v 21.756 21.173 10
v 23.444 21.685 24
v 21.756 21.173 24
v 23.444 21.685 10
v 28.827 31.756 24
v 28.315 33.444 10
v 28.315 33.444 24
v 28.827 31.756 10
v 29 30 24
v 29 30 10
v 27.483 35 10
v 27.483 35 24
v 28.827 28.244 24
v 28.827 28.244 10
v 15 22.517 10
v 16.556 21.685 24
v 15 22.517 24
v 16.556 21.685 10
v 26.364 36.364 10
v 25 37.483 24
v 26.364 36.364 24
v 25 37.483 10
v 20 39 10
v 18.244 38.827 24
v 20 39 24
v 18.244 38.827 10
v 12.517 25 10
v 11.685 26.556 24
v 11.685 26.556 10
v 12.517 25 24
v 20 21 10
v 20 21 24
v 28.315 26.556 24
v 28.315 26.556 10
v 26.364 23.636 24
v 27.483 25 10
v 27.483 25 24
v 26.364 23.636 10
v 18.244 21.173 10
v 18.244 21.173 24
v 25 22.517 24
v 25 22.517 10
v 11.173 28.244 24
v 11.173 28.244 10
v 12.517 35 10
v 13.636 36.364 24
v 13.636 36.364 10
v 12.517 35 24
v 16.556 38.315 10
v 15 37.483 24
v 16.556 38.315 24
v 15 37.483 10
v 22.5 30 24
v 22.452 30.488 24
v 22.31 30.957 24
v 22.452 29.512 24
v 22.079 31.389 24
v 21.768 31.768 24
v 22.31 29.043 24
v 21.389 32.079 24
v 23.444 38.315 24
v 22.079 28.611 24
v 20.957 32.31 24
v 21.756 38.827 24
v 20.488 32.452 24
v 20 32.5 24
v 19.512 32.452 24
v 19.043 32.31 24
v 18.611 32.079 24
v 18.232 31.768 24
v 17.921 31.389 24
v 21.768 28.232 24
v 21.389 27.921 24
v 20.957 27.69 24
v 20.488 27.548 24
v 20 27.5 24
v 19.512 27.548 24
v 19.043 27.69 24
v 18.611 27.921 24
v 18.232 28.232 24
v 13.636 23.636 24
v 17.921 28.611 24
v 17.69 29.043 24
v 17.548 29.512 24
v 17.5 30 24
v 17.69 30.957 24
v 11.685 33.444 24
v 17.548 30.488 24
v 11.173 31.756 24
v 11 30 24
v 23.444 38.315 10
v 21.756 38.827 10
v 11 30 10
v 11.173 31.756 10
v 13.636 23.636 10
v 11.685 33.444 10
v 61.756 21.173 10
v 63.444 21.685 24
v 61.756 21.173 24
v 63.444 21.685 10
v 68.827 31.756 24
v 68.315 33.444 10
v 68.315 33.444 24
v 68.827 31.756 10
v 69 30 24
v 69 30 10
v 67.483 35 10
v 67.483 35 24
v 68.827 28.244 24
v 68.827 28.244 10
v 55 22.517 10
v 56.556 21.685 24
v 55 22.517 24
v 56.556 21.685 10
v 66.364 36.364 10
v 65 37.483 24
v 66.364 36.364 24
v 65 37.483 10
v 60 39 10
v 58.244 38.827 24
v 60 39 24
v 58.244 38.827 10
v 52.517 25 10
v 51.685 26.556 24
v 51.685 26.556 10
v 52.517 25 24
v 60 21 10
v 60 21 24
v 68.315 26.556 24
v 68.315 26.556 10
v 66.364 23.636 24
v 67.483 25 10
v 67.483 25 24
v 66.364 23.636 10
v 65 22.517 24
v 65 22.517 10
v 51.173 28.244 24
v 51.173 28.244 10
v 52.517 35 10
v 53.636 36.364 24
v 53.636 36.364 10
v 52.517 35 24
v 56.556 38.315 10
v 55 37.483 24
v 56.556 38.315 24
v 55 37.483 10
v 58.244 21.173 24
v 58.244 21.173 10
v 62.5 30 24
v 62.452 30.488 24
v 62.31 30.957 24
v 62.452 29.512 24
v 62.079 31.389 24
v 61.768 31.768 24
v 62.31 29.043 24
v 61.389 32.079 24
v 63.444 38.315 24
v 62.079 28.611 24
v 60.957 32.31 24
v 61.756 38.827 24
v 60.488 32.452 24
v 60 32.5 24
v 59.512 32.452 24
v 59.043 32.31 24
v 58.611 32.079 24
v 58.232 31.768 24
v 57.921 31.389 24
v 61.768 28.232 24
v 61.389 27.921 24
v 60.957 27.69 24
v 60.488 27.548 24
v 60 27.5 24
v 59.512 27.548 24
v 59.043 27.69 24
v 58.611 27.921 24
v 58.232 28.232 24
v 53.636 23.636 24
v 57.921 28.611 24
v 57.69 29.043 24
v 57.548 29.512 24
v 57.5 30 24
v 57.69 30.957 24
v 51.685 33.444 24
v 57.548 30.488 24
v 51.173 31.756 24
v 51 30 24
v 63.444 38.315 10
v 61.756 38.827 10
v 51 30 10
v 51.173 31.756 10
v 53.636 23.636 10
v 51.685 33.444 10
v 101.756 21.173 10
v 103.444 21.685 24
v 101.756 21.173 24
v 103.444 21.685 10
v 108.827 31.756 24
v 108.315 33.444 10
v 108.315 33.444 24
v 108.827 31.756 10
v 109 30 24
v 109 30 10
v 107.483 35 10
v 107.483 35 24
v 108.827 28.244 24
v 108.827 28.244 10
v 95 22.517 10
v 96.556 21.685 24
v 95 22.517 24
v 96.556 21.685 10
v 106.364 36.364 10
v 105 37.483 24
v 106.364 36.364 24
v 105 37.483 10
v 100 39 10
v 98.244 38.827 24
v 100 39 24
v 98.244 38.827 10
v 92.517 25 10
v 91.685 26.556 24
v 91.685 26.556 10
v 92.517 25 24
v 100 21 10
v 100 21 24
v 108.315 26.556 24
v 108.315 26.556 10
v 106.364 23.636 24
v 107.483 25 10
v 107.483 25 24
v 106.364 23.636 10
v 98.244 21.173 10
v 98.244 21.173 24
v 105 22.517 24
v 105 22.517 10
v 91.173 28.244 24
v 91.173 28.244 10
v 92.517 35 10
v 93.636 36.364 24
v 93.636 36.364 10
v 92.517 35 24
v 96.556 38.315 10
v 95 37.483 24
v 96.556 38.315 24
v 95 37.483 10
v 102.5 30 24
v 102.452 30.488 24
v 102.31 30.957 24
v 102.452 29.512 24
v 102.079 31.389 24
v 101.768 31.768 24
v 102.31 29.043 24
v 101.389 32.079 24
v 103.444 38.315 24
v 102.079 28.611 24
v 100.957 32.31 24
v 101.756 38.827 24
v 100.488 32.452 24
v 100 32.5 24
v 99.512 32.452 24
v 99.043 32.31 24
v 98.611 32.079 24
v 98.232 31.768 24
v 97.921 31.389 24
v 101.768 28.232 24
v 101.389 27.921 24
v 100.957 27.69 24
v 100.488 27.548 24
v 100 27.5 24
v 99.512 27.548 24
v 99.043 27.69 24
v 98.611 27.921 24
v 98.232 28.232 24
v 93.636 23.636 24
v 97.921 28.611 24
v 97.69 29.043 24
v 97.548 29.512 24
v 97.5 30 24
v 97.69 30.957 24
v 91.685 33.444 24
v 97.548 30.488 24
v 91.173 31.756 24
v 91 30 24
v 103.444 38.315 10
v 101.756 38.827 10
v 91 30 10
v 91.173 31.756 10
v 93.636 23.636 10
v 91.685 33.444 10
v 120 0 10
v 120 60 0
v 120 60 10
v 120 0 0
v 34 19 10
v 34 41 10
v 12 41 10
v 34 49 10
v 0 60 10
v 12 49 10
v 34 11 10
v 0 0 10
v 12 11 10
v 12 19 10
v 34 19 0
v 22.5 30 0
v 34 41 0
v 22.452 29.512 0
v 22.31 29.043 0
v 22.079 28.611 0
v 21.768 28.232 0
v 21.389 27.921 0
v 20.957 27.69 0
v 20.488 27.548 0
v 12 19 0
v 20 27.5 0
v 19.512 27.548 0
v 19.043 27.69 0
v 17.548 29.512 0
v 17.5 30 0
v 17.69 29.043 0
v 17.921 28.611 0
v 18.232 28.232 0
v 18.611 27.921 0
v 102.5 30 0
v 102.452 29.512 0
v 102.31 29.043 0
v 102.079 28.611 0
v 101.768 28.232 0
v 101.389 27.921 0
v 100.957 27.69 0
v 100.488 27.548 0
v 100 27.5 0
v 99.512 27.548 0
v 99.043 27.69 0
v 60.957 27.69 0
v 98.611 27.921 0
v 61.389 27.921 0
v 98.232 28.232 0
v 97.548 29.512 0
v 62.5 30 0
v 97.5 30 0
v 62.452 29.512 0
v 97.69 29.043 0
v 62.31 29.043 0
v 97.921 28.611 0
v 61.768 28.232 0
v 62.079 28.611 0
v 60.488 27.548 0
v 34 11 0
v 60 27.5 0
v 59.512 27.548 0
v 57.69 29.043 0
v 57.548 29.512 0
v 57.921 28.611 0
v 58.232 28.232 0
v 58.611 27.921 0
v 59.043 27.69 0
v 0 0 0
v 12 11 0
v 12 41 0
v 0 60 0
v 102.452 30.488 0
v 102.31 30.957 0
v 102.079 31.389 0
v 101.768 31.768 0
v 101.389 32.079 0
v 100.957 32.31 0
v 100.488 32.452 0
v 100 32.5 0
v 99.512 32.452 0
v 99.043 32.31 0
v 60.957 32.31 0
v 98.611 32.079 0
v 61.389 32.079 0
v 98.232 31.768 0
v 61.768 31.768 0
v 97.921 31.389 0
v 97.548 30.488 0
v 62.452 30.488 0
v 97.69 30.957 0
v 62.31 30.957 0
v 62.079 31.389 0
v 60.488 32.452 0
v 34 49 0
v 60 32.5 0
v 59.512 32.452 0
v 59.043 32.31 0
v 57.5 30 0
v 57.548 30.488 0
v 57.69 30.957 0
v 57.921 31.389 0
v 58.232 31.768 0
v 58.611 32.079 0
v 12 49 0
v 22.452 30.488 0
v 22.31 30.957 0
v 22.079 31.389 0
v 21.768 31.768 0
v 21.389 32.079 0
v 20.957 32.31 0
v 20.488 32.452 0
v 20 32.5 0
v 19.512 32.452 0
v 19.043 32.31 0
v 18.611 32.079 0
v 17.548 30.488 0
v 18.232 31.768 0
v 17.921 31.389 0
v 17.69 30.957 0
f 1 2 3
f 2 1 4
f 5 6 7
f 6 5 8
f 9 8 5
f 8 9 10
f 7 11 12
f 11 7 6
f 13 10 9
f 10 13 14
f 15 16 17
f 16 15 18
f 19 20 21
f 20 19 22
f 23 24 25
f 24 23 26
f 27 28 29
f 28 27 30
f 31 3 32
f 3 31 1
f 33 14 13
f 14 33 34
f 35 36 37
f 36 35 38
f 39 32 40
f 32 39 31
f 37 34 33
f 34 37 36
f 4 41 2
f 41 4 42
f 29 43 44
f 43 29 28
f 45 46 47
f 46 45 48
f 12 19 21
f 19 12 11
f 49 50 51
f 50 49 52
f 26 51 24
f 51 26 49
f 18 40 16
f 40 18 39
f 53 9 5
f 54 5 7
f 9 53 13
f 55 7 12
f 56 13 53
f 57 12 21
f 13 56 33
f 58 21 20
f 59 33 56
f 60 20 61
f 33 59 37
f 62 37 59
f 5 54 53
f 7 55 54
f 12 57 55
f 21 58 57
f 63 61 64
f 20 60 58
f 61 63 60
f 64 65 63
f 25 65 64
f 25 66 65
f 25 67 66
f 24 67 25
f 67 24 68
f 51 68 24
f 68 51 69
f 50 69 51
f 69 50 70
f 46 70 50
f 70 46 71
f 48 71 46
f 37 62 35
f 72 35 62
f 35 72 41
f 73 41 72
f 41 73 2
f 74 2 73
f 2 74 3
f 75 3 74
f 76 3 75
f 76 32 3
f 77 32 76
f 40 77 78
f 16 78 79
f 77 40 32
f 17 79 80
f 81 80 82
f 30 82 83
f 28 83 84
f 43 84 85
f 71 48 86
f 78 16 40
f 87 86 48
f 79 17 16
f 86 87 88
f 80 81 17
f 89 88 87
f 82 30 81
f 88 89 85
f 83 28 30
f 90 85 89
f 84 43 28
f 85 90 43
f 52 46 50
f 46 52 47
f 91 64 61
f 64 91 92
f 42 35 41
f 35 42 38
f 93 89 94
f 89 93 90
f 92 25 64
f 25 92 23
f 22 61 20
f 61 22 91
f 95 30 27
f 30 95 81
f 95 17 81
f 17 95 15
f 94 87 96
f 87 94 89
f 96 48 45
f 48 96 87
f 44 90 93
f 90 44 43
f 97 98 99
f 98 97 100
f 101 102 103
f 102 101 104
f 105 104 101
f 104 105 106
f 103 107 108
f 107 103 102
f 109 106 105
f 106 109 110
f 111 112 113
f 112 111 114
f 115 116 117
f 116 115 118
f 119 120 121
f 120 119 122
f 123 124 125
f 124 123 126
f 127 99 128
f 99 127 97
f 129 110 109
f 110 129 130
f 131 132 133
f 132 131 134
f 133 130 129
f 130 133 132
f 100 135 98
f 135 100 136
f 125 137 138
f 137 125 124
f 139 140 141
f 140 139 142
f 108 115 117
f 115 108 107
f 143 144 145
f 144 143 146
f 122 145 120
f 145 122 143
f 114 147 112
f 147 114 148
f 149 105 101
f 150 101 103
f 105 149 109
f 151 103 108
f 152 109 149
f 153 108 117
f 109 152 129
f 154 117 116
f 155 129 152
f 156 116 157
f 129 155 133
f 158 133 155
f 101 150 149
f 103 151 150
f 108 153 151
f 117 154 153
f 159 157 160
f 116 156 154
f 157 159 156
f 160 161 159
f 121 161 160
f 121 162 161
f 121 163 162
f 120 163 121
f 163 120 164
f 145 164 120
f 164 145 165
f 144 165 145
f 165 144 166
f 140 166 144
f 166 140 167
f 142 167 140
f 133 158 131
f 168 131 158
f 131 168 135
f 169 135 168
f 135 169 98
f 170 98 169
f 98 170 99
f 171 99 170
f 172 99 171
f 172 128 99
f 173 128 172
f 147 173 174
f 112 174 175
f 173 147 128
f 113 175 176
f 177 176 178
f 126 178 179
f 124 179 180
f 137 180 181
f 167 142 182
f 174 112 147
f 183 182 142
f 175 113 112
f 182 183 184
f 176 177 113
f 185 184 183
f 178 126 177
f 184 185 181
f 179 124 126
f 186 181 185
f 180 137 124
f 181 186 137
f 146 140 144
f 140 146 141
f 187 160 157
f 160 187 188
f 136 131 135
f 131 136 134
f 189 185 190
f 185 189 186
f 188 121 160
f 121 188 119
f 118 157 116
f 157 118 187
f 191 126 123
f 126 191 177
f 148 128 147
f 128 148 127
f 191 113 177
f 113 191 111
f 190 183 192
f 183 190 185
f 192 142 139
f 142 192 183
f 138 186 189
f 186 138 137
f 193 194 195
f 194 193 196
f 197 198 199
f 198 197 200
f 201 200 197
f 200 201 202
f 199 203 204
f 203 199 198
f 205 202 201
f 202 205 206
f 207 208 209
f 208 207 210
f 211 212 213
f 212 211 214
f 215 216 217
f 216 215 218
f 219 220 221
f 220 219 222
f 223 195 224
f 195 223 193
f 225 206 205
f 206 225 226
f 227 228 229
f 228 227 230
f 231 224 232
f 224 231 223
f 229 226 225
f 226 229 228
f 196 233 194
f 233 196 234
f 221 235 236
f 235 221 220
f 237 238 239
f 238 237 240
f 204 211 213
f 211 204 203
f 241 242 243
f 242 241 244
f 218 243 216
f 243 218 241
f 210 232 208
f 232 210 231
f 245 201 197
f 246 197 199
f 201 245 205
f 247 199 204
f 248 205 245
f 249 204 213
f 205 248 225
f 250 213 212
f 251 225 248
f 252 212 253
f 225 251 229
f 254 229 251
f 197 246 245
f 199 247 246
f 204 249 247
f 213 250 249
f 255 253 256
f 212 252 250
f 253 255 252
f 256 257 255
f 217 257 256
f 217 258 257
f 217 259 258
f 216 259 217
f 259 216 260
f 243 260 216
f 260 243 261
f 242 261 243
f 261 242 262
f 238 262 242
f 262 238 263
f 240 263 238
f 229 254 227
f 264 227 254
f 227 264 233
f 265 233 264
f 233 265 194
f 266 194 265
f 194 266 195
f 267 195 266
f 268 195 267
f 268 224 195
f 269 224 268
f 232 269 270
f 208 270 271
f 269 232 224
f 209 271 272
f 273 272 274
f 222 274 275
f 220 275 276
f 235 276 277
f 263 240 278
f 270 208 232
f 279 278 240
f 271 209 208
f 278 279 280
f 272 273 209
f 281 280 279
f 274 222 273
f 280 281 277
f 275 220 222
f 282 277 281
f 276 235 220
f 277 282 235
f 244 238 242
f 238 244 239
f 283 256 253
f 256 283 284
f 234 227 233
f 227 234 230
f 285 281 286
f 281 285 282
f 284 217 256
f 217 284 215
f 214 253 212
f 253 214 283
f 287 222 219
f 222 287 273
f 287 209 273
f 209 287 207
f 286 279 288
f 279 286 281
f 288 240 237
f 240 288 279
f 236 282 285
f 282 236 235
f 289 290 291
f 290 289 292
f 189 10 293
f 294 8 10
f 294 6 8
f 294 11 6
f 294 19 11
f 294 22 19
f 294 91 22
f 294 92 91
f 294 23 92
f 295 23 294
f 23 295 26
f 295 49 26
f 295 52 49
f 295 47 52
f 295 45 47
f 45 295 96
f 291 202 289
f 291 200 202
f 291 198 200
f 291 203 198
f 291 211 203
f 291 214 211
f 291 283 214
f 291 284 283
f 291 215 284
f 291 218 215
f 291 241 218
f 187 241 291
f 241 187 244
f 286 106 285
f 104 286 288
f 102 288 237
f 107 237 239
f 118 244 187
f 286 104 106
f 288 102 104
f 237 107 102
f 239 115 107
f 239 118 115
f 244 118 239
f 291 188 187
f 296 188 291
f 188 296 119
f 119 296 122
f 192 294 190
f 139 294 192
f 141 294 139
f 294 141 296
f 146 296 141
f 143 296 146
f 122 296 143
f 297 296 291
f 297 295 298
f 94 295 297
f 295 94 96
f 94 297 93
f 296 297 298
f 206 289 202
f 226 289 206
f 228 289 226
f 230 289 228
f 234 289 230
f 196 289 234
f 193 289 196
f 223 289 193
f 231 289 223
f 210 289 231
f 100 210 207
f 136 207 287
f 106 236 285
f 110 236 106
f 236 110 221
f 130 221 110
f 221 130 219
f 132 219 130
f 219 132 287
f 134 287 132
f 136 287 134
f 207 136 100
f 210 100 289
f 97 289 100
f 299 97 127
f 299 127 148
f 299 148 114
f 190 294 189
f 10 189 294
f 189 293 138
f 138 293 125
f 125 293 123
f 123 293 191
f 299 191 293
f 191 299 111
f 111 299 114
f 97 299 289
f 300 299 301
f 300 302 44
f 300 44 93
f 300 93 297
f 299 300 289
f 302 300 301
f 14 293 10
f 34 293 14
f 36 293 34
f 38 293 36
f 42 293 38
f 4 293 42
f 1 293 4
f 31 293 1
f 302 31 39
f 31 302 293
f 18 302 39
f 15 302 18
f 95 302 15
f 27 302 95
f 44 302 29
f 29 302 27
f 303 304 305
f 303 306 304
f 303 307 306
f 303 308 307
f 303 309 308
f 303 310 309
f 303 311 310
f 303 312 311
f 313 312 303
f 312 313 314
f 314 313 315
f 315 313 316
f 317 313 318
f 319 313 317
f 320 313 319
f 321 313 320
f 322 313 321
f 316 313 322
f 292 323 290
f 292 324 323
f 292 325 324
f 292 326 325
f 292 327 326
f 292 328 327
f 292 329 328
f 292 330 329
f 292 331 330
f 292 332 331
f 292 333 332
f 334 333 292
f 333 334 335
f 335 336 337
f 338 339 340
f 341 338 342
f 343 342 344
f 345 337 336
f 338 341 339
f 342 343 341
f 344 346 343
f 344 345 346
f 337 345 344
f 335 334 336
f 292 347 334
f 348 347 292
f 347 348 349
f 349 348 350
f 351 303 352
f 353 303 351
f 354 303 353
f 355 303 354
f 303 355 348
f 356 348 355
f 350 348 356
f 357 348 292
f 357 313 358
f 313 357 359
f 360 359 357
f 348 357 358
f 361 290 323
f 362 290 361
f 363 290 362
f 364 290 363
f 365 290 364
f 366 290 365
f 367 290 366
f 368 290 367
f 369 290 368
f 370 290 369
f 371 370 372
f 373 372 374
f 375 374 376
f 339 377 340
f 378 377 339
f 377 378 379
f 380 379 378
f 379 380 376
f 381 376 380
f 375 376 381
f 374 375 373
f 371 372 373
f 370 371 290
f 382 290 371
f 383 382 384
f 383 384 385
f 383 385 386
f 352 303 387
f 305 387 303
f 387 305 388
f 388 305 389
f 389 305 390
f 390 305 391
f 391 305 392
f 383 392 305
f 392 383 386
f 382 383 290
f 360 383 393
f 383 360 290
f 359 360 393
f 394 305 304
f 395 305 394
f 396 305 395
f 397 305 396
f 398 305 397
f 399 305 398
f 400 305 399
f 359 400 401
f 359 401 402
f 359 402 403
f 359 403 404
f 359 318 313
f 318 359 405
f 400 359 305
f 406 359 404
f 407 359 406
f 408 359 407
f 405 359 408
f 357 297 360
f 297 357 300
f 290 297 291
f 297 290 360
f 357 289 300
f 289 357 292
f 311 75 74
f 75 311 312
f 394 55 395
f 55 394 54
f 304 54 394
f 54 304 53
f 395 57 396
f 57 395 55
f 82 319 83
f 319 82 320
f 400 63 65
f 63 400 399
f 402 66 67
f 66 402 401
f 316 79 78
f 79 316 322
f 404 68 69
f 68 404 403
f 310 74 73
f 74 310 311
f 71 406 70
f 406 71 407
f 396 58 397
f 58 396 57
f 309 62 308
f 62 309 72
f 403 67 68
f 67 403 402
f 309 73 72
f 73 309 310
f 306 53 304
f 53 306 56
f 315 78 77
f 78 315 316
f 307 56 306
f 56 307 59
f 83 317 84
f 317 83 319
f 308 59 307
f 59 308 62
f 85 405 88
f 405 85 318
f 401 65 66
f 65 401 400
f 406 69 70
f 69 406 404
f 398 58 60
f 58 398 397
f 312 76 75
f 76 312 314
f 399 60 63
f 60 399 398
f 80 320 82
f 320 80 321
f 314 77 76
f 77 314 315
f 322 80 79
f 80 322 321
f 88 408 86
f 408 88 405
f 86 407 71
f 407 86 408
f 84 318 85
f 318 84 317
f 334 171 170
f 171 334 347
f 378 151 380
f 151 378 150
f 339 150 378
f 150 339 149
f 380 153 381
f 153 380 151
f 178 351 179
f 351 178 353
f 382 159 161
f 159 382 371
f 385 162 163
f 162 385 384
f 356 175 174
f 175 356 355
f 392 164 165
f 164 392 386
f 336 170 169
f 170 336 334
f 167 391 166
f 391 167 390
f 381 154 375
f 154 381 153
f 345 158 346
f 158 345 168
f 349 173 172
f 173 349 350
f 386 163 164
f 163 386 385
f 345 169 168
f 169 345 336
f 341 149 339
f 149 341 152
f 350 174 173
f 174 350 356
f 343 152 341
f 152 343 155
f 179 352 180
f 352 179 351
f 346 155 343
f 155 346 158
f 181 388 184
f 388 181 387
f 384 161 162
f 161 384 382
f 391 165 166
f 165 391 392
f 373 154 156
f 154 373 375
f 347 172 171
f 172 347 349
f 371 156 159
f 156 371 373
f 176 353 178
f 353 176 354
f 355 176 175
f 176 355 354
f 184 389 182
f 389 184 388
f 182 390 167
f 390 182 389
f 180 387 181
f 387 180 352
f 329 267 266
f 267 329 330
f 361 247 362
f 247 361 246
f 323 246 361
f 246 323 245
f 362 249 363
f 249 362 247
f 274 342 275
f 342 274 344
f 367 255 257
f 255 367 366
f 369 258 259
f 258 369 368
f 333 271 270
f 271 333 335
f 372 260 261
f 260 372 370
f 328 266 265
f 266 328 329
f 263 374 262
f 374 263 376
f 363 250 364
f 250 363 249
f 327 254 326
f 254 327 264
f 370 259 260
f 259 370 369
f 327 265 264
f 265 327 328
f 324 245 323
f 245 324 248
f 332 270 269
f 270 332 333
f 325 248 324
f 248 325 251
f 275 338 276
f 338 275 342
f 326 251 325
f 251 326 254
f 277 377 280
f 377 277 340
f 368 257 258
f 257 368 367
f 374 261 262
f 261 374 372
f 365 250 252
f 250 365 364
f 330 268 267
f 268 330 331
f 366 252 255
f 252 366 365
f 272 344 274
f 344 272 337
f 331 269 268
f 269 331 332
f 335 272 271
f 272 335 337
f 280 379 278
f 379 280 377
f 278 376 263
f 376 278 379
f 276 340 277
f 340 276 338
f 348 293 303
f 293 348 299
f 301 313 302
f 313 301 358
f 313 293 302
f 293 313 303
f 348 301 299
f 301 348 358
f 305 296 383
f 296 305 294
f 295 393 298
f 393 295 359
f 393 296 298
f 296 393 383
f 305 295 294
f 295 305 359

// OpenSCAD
$fn = 32;

// ----------------------------------------------------------------------
// Drill jig: three_boss_slot jig
// ----------------------------------------------------------------------

// --- parameters (mm) ---
plate_l = 120;            // plate length, X
plate_w = 60;             // plate width, Y
plate_t = 10;             // plate thickness
boss_d = 18;              // guide boss diameter
boss_h = 15;              // boss height above the plate
guide_d = 5;              // guide hole diameter
boss_pitch = 40;          // boss pitch
slot_w = 8;               // clamp slot width
slot_l = 22;              // clamp slot length
slot_x = 12;              // slot start X

n_boss = 3;  // guide bosses
boss_x0 = (plate_l - (n_boss - 1) * boss_pitch) / 2;  // first boss X
boss_top = plate_t - 1 + boss_h;  // boss crown height
total_h = boss_top;  // overall height

difference() {
  union() {
  cube([plate_l, plate_w, plate_t]);
  for (i = [0 : n_boss - 1])
    translate([boss_x0 + i * boss_pitch, plate_w / 2, plate_t - 1])
      cylinder(h = boss_h, d = boss_d);
  }
  for (i = [0 : n_boss - 1])
    translate([boss_x0 + i * boss_pitch, plate_w / 2, -1])
      cylinder(h = plate_t + boss_h, d = guide_d);
  for (cy = [plate_w * 0.25, plate_w * 0.75])
    translate([slot_x, cy - slot_w / 2, -1])
      cube([slot_l, slot_w, plate_t + 2]);
}
